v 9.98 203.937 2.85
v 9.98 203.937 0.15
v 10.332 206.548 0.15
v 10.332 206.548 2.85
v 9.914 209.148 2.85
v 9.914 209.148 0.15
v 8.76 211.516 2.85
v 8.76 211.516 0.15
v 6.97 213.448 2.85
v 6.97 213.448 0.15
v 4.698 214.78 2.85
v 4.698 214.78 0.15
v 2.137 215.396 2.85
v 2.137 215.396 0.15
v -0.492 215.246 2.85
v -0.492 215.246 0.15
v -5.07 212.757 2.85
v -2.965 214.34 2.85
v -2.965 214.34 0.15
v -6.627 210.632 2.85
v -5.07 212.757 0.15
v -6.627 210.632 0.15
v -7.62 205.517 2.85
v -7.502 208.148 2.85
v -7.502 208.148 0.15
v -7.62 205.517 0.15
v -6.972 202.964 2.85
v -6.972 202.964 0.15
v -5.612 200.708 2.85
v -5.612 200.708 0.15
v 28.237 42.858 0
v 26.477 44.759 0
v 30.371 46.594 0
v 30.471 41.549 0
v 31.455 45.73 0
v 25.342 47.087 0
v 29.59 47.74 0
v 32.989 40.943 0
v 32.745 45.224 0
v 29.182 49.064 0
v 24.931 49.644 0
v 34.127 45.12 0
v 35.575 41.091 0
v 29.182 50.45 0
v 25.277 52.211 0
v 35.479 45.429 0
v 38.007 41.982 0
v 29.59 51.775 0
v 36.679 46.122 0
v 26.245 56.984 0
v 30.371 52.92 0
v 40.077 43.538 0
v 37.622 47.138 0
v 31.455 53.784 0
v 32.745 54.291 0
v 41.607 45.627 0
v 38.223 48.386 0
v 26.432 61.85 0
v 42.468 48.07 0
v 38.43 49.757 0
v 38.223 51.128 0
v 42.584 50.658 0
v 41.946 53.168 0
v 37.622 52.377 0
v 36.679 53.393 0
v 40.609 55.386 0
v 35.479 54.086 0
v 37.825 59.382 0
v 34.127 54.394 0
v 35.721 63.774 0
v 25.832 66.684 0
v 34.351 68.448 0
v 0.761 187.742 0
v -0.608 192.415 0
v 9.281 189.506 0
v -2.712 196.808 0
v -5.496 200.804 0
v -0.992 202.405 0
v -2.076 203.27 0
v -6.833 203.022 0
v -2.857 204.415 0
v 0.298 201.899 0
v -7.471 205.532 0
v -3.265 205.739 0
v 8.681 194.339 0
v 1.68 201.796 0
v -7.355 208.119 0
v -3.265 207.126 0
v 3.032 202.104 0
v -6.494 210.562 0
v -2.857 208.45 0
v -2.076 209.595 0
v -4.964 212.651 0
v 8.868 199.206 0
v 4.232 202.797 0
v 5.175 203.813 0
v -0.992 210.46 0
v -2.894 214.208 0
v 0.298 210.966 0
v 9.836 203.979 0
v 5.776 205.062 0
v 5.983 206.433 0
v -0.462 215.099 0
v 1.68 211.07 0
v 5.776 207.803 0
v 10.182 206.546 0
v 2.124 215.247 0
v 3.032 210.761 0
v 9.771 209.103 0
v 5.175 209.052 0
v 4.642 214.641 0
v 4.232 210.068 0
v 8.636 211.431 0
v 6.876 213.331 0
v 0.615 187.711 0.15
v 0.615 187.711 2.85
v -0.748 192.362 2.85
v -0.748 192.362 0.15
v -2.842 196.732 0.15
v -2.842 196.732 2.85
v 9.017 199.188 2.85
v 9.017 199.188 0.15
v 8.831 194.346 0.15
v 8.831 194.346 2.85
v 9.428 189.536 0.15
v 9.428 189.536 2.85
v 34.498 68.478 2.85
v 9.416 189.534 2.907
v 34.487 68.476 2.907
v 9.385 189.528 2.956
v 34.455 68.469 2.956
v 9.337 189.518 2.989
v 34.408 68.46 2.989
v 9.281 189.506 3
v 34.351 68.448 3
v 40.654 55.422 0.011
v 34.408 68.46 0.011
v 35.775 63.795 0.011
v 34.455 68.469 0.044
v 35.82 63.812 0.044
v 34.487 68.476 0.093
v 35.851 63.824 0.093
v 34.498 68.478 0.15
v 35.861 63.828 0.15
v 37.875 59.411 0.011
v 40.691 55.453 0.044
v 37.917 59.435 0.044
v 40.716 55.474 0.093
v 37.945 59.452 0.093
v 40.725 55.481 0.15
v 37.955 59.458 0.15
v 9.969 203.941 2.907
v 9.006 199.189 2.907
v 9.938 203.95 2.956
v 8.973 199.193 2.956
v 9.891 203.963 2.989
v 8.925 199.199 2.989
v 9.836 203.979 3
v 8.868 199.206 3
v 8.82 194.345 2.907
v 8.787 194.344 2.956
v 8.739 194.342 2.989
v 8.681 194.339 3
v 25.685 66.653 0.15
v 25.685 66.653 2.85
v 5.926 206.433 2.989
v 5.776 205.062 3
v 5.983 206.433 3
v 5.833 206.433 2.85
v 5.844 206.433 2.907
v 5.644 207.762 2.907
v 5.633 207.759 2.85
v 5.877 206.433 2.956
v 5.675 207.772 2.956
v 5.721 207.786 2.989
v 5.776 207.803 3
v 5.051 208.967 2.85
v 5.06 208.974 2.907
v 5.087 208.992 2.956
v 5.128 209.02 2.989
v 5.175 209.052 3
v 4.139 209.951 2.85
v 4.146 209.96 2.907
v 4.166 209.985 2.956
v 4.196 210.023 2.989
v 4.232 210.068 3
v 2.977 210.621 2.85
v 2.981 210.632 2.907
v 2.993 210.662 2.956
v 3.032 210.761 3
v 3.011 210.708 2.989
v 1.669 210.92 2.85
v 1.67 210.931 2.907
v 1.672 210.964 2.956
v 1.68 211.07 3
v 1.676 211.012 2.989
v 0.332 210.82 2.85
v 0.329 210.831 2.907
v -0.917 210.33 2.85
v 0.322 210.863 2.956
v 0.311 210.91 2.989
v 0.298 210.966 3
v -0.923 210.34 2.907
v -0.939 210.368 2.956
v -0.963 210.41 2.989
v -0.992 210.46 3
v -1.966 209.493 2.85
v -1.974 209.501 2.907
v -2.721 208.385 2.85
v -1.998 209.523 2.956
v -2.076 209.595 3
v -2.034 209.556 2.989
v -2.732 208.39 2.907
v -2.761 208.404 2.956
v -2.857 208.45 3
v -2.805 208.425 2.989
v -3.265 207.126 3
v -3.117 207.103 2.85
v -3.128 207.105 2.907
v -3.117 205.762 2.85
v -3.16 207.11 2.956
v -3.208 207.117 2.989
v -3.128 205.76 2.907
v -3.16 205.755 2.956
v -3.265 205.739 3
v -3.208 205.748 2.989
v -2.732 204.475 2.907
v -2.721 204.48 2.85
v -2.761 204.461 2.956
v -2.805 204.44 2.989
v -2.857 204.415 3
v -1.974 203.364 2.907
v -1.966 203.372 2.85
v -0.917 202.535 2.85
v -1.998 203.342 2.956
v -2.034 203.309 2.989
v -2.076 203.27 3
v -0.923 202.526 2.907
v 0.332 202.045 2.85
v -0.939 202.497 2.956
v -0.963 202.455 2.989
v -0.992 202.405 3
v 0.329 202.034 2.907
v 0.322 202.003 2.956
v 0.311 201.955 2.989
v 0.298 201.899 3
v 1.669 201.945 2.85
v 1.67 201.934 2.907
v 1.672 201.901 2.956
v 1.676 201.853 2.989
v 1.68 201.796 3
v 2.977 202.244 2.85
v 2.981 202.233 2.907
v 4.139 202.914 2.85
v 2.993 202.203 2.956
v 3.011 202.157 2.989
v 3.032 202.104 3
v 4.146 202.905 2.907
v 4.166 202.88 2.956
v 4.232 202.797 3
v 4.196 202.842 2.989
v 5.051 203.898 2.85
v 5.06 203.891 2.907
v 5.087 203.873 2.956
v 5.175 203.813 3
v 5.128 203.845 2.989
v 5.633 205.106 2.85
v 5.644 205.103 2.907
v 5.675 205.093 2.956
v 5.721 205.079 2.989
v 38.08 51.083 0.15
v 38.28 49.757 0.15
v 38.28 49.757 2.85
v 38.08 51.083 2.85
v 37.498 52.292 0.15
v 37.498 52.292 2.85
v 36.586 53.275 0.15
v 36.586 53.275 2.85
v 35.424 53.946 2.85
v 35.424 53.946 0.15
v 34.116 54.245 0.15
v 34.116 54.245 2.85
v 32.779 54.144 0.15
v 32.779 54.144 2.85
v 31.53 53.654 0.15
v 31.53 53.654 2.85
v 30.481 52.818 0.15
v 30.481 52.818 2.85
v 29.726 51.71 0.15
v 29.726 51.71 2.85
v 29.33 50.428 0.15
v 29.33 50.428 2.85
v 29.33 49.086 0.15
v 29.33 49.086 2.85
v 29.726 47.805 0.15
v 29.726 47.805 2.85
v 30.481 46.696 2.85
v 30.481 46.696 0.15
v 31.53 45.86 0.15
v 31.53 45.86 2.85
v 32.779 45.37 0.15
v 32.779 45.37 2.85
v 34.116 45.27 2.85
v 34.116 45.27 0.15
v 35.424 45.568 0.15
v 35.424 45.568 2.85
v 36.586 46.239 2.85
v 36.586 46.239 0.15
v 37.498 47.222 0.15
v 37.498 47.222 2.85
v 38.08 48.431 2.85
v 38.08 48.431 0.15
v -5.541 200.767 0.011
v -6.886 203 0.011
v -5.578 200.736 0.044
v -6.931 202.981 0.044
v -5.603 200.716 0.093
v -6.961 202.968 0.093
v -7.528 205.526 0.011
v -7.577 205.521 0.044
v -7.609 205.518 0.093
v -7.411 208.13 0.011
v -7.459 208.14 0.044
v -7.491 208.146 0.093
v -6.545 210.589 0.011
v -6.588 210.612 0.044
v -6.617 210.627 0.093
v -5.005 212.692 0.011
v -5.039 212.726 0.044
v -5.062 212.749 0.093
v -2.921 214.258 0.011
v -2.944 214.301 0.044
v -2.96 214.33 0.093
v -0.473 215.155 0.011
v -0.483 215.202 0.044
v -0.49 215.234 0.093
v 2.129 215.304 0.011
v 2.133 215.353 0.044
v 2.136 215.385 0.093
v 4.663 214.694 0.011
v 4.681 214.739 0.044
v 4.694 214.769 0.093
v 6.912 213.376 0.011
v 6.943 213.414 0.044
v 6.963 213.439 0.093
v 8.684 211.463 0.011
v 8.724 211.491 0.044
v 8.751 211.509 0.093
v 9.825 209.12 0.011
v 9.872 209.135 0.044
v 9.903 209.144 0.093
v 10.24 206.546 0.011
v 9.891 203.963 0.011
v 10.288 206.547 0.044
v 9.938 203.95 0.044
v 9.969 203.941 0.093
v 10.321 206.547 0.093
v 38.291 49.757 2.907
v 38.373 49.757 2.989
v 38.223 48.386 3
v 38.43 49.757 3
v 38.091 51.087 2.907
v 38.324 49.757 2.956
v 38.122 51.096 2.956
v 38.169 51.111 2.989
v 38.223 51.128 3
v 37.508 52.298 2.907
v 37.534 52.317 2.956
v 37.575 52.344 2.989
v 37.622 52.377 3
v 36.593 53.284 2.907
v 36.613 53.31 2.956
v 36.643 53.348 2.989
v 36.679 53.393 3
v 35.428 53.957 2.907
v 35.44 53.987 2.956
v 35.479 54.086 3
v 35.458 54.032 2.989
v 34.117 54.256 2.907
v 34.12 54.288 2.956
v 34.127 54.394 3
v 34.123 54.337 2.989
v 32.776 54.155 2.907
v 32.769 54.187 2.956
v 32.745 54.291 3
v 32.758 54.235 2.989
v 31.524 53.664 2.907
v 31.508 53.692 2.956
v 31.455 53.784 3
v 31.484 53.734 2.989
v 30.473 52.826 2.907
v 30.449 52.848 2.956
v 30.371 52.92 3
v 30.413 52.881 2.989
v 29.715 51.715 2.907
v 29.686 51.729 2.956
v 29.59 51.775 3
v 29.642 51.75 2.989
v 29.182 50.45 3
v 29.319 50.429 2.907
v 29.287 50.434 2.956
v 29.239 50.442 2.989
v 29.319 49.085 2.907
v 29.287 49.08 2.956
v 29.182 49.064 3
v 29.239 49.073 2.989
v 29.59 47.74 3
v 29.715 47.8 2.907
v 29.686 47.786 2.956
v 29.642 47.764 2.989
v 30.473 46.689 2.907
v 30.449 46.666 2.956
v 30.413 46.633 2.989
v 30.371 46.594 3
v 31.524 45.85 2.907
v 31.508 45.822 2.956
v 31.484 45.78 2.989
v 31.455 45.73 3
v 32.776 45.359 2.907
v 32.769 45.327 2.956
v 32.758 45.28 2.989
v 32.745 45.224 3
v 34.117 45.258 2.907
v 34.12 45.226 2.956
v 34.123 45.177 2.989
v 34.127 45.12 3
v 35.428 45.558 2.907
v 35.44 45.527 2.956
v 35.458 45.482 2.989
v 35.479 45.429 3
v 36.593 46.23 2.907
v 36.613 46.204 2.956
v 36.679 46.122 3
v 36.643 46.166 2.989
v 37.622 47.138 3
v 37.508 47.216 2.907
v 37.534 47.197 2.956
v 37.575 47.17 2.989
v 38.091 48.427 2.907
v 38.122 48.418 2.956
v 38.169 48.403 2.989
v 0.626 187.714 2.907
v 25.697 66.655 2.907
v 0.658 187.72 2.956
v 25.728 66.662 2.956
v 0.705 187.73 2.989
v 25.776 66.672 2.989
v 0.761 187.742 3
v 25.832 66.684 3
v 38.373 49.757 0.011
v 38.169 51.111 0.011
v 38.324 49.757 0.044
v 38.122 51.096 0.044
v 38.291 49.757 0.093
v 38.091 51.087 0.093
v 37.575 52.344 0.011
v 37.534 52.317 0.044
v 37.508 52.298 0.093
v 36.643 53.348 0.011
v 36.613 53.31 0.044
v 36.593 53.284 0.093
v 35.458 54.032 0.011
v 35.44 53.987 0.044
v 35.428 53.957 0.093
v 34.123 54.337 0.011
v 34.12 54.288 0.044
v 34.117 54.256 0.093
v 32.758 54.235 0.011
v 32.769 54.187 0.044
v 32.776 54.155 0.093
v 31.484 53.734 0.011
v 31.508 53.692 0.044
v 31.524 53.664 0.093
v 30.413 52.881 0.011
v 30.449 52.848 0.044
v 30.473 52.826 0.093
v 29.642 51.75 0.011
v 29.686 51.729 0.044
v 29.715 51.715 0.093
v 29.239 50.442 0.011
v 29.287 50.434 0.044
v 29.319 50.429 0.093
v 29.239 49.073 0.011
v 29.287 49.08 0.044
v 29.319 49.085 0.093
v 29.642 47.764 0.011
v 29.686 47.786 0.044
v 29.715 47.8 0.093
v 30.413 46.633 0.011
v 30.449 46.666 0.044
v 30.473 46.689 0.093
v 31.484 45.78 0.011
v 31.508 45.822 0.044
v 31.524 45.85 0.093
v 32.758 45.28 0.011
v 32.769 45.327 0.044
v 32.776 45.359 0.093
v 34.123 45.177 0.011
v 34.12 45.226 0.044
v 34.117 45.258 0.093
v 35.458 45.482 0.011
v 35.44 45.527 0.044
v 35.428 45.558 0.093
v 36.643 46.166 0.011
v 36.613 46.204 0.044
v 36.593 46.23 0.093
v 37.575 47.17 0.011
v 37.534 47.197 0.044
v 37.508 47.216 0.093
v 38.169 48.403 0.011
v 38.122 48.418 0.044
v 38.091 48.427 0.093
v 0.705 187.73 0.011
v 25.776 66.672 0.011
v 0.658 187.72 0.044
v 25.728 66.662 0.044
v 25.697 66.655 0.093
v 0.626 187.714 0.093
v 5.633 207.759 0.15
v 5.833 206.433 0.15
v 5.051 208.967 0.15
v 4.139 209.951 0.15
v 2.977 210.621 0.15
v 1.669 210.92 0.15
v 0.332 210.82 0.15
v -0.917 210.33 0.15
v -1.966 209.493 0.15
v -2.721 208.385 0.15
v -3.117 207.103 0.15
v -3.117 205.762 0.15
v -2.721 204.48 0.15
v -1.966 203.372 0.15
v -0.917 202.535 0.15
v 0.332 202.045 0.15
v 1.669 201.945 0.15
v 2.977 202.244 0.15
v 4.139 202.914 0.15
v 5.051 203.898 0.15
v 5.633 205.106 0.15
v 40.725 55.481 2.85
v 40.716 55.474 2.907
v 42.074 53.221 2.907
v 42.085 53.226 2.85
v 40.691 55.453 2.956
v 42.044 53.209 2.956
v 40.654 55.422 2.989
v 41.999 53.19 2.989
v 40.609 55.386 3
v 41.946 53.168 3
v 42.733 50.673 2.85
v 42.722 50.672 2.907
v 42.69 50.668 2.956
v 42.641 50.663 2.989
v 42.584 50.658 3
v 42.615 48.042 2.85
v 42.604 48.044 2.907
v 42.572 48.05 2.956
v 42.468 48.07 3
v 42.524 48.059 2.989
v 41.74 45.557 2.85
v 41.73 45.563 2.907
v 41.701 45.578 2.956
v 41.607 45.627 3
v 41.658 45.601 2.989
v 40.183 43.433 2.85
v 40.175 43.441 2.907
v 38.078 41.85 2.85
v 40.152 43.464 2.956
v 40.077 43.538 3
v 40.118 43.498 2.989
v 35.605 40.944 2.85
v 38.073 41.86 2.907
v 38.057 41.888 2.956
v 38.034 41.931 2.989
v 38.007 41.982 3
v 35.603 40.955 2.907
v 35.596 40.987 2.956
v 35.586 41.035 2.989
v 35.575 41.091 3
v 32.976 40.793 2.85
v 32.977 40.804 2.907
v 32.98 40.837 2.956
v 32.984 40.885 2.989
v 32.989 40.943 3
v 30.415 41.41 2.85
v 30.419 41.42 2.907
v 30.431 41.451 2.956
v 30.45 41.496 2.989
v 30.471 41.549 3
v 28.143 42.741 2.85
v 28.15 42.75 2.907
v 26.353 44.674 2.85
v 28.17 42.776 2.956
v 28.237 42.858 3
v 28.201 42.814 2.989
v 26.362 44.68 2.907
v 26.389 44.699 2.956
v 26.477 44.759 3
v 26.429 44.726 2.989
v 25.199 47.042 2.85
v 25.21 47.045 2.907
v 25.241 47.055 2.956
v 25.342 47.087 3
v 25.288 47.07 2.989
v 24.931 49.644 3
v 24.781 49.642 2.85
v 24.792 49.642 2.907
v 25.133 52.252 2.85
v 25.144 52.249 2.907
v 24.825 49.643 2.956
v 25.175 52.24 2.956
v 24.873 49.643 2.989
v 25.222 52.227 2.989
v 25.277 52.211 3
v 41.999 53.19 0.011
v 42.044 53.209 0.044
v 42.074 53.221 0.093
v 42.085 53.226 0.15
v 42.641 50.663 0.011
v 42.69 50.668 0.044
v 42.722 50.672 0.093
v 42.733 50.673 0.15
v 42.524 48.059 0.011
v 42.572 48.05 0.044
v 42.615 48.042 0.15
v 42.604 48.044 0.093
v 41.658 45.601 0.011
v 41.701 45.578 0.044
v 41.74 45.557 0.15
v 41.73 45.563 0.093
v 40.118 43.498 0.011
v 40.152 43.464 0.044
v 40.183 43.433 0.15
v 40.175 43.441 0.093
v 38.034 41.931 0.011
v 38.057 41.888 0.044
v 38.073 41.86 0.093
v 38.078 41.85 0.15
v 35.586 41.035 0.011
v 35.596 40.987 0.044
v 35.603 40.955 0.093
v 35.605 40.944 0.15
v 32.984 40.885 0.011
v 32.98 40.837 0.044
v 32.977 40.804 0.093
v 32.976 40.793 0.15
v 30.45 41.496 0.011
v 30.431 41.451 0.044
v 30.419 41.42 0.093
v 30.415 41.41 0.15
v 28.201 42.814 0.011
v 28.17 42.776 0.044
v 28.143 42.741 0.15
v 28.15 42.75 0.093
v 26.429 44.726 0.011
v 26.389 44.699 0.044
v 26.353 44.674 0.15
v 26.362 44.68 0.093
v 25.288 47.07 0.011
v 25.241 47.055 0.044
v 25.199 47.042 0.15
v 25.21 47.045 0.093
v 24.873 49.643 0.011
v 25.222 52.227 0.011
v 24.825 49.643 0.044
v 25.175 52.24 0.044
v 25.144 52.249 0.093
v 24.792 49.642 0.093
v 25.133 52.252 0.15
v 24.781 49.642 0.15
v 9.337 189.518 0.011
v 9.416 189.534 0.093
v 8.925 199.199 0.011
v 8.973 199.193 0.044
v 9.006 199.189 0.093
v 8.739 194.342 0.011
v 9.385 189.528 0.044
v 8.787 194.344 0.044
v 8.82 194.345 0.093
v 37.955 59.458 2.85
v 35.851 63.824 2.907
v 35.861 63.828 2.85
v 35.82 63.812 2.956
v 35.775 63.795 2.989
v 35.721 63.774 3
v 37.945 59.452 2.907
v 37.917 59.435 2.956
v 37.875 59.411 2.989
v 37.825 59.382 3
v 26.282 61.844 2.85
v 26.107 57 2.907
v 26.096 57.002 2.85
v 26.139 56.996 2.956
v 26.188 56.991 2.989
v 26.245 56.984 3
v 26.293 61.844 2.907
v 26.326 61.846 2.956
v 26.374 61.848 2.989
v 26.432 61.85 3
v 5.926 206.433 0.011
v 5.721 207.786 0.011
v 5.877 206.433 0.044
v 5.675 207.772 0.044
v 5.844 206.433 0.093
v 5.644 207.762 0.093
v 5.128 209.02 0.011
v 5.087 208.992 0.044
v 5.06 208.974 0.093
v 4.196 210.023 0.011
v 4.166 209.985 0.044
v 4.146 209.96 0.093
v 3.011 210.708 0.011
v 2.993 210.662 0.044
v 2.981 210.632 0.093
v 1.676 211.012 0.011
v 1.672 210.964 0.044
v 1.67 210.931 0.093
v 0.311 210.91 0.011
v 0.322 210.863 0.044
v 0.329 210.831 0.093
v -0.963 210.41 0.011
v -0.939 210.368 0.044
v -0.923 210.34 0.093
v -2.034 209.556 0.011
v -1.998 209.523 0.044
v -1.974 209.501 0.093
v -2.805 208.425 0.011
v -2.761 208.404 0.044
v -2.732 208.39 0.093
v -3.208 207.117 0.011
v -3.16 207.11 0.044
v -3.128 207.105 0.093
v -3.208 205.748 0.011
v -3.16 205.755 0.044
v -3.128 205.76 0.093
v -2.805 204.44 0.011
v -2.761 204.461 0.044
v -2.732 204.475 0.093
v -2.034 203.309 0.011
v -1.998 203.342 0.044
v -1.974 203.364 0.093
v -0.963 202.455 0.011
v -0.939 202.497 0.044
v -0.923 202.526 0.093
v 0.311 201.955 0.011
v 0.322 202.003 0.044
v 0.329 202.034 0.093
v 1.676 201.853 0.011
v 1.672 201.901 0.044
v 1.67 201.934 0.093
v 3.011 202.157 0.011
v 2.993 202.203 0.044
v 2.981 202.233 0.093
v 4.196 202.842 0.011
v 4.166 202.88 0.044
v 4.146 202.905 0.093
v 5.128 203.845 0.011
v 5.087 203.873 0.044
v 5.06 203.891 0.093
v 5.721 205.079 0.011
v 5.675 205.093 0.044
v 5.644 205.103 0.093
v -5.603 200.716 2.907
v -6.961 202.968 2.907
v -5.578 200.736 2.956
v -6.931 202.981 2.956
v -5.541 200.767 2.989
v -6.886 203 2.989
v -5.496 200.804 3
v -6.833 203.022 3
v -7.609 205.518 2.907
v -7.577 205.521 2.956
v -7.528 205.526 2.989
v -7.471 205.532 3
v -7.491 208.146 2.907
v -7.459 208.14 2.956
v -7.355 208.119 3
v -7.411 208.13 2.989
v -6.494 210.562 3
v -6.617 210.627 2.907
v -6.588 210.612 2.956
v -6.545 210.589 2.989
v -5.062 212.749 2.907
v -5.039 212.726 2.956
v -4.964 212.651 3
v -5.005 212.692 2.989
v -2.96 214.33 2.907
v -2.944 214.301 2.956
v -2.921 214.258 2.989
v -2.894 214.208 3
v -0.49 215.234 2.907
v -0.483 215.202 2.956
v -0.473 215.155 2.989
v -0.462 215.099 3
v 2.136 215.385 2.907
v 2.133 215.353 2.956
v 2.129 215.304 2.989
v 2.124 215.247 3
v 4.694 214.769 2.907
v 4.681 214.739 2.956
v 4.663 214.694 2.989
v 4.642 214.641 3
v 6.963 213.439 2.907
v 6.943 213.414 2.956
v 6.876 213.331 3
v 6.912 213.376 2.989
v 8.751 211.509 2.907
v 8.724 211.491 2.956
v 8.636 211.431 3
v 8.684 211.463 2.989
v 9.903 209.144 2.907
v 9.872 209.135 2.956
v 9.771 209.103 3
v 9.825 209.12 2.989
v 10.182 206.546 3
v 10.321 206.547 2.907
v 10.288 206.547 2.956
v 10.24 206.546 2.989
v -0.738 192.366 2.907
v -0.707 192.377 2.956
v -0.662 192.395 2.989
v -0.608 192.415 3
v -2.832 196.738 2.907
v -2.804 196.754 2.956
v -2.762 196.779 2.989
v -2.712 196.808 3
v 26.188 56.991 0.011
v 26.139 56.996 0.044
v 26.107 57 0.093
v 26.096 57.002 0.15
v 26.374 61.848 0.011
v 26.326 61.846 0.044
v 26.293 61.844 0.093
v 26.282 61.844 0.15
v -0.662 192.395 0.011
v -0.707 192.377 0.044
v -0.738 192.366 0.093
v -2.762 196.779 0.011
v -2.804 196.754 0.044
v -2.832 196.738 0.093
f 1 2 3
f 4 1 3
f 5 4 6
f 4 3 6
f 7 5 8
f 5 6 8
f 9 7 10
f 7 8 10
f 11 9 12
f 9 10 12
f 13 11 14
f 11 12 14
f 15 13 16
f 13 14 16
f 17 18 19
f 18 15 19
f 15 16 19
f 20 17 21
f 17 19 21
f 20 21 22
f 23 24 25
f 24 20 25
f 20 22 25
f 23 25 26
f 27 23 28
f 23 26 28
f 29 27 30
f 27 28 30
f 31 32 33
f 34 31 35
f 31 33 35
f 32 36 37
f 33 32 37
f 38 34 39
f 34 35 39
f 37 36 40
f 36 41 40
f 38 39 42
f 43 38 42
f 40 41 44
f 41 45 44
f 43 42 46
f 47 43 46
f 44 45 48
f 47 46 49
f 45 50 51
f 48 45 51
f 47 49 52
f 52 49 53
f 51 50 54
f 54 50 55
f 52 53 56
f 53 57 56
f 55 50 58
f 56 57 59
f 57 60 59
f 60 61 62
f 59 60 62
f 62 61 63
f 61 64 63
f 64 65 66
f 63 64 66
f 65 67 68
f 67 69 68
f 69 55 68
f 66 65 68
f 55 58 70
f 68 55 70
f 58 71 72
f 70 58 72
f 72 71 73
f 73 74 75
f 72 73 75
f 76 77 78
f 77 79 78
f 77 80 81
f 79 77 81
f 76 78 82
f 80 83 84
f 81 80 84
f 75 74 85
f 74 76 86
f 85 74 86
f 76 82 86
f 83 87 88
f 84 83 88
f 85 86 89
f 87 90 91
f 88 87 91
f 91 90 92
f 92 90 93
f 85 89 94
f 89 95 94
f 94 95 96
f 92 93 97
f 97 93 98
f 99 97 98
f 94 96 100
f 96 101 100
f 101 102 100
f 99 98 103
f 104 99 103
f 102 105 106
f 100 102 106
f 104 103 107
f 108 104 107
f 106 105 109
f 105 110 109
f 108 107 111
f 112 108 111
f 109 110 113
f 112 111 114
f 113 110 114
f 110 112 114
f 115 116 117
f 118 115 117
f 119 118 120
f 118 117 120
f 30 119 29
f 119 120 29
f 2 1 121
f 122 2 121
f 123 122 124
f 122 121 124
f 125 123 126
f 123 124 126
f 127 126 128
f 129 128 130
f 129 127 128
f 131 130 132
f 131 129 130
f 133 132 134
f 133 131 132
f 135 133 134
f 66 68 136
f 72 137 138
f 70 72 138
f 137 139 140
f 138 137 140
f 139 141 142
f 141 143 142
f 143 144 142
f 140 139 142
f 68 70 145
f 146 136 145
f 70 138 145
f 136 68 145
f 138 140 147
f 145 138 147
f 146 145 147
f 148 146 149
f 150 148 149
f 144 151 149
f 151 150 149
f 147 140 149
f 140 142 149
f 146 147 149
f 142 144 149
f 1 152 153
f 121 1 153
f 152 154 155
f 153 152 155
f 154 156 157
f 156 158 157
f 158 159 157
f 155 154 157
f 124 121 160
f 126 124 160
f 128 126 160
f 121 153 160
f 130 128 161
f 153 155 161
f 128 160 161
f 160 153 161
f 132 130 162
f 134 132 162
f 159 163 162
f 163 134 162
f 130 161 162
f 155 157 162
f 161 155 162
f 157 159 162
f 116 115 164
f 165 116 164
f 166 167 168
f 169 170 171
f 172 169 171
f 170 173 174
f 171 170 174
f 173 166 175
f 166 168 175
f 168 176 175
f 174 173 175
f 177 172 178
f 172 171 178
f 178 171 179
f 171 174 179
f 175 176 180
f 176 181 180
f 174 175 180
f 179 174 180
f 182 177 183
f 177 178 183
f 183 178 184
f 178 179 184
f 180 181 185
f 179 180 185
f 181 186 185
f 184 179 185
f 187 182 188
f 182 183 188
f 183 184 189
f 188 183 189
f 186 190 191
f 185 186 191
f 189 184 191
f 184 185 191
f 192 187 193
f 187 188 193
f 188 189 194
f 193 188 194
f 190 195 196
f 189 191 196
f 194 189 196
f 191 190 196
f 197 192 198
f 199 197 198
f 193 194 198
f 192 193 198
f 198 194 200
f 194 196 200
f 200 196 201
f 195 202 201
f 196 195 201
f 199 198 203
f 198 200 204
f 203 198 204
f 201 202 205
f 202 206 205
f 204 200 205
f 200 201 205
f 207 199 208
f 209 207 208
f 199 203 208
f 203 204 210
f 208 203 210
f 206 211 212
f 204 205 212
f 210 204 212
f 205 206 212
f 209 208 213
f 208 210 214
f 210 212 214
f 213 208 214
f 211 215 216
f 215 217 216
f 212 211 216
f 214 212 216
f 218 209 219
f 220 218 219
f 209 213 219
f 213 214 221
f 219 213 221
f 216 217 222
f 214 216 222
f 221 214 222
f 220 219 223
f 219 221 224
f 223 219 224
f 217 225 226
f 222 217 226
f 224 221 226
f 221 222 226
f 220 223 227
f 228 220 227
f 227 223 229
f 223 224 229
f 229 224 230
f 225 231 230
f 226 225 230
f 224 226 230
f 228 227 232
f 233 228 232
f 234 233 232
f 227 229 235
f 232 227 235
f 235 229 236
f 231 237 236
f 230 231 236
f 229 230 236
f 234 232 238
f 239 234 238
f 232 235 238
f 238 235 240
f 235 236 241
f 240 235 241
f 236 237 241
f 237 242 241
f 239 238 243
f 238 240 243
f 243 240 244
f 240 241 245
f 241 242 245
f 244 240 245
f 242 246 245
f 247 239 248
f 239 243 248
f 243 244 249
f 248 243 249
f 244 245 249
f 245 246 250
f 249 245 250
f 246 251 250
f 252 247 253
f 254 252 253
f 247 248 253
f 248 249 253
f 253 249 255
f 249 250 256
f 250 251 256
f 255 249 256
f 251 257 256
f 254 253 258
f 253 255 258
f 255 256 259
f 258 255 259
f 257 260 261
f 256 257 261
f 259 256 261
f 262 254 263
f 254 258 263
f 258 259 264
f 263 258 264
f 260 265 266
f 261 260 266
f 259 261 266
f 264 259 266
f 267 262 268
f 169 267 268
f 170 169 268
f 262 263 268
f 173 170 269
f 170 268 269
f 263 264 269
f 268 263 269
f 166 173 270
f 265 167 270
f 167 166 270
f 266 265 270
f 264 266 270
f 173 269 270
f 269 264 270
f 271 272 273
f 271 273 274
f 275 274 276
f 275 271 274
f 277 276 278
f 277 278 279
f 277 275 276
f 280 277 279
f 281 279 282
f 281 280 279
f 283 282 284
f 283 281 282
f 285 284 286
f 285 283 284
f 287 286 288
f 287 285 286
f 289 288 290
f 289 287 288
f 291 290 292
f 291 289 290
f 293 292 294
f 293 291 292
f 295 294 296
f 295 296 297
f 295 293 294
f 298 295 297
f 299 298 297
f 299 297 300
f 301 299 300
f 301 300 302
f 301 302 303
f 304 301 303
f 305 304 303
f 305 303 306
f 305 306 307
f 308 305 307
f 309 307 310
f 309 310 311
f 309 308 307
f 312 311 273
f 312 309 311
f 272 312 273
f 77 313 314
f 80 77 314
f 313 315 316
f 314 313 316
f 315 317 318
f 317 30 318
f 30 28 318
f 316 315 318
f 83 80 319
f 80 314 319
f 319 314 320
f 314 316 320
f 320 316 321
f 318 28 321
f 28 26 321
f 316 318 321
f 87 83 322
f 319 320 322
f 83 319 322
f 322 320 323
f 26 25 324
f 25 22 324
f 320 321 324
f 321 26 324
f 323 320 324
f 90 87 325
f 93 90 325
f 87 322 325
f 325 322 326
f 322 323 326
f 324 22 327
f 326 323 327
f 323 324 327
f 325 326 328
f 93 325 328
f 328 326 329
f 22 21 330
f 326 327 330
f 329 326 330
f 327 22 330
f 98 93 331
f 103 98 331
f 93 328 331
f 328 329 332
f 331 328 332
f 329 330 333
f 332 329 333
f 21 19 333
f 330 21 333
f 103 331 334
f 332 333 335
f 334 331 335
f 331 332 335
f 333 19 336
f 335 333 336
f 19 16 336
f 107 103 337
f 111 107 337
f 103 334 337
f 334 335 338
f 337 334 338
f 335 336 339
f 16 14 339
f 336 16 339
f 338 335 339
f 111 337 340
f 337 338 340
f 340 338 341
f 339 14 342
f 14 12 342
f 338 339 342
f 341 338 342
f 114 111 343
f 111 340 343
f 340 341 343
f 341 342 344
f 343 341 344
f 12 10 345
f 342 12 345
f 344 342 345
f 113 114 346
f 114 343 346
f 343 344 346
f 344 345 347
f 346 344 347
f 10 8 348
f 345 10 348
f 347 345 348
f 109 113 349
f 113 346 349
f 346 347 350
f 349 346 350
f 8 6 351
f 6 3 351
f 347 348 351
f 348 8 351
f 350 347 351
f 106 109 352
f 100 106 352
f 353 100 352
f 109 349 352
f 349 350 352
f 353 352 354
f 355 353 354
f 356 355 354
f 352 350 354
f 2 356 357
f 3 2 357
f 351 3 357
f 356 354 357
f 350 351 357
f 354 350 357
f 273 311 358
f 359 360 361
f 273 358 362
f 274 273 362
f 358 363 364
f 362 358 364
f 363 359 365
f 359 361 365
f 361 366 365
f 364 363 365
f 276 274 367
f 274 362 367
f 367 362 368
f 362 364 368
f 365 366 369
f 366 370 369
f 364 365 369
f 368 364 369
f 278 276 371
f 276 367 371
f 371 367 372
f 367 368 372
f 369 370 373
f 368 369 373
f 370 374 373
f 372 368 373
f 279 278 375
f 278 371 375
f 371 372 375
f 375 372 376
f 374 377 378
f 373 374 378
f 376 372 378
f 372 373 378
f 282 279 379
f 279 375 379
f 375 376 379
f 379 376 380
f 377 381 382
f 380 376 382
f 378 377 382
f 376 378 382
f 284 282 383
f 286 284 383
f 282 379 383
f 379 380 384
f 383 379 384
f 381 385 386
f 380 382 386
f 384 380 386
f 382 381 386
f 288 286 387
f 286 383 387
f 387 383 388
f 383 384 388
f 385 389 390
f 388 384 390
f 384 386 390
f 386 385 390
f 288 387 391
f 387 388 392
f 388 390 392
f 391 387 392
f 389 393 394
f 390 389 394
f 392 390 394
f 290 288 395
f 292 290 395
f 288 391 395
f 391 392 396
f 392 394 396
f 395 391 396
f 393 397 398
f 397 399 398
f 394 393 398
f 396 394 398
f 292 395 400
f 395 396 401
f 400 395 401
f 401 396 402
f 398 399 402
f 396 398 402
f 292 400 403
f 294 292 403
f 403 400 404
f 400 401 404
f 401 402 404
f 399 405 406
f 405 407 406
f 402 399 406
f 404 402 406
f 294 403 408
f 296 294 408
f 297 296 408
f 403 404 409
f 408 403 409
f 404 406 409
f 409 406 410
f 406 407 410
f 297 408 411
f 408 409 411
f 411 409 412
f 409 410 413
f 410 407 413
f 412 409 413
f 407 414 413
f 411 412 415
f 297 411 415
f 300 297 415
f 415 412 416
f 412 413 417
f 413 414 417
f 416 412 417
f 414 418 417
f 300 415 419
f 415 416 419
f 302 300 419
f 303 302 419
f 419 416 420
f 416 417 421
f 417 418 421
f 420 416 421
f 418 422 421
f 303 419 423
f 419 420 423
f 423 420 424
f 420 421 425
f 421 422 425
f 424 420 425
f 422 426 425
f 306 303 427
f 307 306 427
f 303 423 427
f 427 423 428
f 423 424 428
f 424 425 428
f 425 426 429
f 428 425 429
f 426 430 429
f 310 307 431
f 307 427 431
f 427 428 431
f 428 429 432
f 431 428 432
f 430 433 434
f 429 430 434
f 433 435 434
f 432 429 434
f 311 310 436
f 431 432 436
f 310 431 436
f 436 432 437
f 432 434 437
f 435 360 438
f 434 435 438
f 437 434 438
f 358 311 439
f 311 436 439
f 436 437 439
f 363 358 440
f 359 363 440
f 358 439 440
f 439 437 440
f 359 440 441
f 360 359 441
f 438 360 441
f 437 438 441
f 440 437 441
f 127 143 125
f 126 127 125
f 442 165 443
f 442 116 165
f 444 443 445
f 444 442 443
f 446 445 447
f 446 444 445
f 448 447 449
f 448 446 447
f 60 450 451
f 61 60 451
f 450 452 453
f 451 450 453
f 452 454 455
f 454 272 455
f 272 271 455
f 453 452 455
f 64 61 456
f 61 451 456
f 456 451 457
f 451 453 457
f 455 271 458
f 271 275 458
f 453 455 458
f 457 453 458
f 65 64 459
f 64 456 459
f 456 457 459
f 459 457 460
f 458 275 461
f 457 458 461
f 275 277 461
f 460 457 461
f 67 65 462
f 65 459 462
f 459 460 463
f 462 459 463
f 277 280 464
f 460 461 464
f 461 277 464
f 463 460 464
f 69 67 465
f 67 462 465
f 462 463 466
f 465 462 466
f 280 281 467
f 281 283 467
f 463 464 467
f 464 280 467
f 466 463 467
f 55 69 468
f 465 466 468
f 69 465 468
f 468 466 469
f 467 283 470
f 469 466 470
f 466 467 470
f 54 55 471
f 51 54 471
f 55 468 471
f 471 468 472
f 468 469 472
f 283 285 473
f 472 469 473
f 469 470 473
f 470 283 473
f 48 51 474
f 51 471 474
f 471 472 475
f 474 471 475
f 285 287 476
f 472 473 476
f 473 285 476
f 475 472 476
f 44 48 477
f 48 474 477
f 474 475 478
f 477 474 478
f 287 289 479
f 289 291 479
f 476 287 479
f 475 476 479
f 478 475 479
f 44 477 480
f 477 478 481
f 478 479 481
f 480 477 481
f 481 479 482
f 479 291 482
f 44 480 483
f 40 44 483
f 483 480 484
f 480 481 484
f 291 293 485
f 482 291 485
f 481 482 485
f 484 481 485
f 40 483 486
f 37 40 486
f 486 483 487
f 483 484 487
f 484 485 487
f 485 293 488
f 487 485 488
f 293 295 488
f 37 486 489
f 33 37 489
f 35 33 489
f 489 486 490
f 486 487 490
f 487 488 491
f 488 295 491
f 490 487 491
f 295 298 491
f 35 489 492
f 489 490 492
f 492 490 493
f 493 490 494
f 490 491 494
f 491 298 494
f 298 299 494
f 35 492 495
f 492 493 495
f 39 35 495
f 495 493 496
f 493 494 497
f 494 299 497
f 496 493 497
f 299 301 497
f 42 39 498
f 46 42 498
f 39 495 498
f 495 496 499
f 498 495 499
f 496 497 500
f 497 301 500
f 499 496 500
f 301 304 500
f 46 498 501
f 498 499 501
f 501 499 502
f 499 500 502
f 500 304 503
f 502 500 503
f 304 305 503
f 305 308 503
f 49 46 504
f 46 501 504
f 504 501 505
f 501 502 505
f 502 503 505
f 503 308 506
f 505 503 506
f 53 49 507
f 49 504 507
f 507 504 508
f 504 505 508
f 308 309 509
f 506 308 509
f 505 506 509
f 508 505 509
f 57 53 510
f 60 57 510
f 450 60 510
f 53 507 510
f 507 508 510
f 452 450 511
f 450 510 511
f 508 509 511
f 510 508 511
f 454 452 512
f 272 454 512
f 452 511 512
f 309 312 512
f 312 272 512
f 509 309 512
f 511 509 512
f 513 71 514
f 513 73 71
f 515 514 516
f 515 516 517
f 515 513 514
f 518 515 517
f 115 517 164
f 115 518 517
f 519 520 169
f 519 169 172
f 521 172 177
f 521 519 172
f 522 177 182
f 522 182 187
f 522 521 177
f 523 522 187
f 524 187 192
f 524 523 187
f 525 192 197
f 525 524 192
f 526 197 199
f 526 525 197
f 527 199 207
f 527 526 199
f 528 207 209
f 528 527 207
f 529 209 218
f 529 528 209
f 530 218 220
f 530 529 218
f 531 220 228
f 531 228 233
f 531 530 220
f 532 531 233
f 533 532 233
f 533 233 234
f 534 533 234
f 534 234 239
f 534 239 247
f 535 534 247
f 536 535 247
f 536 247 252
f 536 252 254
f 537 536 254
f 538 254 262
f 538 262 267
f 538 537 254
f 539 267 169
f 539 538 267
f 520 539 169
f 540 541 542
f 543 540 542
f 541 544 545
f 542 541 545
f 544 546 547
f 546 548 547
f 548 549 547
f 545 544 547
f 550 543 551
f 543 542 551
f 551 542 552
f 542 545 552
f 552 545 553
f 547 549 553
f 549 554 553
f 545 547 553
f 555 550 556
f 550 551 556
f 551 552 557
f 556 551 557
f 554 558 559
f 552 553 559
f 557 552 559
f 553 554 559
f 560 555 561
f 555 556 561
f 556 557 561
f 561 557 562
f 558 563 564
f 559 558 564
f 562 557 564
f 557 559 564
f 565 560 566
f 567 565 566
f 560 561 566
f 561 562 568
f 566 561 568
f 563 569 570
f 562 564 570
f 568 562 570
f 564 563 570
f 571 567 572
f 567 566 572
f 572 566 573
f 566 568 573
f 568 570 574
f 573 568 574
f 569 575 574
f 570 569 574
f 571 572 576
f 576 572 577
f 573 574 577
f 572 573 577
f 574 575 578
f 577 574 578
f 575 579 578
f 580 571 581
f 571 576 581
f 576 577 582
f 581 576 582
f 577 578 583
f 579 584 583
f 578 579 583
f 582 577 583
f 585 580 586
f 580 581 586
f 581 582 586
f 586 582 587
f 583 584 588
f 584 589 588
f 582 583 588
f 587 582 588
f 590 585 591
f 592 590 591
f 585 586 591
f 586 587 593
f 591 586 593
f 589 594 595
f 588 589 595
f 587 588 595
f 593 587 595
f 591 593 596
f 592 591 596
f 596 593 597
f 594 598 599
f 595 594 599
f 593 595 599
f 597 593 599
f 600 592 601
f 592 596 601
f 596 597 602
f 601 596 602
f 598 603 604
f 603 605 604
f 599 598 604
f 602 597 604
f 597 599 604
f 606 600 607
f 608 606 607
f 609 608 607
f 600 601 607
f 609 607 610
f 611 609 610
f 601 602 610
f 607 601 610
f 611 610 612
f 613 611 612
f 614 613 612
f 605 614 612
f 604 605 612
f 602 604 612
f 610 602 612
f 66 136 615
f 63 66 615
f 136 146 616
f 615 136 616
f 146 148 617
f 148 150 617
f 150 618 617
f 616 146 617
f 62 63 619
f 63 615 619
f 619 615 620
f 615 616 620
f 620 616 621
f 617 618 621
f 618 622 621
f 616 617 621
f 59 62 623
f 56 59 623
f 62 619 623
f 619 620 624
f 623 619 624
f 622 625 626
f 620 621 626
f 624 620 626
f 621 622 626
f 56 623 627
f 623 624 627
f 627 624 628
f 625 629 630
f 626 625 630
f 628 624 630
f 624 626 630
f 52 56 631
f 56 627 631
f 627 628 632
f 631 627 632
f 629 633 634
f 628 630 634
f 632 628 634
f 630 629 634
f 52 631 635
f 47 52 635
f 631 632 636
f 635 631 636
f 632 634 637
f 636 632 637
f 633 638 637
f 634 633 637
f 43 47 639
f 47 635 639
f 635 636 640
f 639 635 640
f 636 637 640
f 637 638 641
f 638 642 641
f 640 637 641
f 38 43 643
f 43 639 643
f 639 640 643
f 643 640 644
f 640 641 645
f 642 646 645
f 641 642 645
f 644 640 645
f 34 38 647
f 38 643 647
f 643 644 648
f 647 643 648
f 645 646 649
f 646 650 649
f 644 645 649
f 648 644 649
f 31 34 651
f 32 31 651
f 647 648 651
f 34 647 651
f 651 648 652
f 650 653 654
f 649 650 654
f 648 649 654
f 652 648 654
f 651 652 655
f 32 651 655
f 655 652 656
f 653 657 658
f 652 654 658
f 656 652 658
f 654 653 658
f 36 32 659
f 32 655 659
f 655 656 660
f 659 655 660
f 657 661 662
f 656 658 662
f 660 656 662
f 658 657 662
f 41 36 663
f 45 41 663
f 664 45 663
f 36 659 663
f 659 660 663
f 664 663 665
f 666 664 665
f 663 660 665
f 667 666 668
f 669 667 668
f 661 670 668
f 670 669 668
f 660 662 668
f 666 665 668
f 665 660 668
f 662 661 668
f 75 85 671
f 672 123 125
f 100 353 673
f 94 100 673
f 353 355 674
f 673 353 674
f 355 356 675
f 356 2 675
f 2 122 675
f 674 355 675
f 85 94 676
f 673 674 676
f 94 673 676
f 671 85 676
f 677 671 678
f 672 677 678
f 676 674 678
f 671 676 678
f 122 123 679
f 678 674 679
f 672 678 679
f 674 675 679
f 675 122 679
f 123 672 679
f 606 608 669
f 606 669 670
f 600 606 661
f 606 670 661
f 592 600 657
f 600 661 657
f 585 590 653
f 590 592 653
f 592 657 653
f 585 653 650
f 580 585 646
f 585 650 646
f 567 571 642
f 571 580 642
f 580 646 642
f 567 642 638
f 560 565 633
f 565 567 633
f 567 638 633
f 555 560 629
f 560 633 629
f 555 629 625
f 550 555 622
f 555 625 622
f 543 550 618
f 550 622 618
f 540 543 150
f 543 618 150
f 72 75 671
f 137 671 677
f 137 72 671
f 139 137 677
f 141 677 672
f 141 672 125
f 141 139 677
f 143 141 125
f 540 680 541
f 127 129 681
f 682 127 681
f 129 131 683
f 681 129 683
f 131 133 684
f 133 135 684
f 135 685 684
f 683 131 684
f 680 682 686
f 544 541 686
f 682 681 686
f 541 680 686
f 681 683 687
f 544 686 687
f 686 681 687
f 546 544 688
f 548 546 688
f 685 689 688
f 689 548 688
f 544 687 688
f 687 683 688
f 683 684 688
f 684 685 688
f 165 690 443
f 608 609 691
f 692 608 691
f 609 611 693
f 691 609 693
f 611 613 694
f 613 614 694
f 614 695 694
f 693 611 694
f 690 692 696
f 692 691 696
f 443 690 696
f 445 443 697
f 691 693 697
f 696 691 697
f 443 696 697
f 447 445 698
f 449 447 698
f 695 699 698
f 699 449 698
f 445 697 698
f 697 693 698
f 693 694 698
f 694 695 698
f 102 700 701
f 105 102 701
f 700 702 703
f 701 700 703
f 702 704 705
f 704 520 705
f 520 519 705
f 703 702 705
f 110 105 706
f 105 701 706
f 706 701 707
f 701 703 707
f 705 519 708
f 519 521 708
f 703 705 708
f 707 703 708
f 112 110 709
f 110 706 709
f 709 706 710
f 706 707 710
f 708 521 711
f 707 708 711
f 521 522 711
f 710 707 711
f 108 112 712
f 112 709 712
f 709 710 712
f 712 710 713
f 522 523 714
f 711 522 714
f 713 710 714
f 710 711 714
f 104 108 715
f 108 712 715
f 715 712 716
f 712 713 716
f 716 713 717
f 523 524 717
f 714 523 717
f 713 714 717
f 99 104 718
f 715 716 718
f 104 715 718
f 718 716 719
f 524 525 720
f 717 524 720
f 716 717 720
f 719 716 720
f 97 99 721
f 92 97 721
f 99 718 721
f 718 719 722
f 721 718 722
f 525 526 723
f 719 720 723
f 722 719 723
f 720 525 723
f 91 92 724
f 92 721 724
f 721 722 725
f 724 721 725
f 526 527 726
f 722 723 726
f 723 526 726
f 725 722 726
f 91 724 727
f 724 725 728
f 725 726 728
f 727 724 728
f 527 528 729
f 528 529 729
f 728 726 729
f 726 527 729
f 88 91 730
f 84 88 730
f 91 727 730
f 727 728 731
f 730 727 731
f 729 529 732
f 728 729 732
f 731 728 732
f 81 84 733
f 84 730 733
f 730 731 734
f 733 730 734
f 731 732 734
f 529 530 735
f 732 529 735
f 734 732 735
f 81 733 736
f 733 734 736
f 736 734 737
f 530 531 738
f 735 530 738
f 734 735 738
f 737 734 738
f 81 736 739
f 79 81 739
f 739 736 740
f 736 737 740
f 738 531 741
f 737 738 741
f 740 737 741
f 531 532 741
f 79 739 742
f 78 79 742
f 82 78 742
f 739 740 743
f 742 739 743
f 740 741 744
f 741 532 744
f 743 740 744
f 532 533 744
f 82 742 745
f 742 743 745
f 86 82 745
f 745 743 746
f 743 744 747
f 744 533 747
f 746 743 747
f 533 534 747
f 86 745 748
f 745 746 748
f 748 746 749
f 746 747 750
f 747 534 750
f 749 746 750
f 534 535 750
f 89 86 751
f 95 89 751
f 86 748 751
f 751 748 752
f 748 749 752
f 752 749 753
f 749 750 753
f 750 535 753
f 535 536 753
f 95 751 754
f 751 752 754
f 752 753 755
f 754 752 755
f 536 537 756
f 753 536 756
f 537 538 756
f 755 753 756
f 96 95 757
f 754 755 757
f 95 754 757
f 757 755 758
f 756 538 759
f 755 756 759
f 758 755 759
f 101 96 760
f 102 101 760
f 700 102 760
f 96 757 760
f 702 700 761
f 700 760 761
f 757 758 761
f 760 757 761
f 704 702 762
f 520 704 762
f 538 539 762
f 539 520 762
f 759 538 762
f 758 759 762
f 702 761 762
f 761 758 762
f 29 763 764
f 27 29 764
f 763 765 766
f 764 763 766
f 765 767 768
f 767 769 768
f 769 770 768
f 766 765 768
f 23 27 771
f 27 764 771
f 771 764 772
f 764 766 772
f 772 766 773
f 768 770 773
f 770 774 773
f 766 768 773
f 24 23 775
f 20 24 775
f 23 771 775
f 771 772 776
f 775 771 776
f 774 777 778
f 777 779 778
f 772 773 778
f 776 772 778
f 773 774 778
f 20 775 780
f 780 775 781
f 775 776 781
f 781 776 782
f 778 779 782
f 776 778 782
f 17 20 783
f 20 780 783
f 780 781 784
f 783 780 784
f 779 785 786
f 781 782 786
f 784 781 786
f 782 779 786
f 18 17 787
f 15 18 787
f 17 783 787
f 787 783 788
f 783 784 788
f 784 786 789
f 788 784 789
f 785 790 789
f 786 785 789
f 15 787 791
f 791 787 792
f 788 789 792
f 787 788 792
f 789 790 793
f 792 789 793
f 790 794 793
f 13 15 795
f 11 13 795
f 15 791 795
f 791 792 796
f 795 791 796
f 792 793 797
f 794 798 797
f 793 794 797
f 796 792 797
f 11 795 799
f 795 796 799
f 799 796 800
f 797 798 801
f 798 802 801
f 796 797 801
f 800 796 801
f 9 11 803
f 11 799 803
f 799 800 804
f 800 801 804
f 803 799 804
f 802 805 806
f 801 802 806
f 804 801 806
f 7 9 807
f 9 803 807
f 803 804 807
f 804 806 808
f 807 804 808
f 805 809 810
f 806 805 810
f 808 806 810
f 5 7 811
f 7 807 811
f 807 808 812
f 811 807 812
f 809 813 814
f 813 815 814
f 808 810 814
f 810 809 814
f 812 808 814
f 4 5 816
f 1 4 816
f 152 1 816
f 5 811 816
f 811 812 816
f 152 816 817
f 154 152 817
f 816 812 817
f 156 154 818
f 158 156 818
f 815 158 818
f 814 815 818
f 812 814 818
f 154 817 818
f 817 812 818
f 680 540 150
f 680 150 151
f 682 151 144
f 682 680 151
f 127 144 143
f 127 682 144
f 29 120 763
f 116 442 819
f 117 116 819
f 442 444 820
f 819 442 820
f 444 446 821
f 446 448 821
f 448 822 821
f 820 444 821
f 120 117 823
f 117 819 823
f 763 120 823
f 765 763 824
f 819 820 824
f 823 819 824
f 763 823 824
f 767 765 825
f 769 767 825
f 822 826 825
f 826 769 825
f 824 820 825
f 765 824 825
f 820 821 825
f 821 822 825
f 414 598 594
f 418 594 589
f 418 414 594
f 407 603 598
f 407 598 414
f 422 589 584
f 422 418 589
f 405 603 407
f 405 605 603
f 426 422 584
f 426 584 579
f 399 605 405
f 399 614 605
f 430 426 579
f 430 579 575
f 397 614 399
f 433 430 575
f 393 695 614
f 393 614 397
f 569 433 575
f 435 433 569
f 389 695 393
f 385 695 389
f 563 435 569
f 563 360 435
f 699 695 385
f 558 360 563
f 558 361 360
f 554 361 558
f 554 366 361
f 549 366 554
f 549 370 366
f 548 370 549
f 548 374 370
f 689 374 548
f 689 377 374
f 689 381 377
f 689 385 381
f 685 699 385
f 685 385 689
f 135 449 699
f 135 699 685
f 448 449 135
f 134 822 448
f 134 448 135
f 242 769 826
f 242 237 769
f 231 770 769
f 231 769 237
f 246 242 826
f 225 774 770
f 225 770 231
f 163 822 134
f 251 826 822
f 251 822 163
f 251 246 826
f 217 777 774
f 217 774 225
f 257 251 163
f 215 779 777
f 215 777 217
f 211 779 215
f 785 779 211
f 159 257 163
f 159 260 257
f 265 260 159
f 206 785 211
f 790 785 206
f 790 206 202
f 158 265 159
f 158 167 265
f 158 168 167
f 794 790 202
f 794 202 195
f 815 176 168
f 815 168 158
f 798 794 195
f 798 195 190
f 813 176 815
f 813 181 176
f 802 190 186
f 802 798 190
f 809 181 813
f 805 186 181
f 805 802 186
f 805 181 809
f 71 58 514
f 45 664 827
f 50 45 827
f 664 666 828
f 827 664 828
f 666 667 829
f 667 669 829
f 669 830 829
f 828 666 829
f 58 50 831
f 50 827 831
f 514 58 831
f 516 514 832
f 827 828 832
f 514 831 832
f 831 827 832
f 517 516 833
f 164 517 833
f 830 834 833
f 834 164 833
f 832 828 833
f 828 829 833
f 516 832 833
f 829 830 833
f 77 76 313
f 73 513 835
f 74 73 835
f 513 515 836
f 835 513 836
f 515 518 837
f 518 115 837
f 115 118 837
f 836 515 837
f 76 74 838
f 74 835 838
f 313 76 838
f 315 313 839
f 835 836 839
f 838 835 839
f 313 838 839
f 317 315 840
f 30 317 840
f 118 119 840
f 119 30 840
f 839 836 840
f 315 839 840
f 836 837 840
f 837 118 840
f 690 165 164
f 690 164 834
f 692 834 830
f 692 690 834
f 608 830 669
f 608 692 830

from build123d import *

# Parameters (mm, degrees)
SZKIC2_R                    = 4.5
DODANIE_WYCI_GNI_CIE1_DEPTH = 3
ZAOKR_GLENIE1_R             = 30
ZAOKR_GLENIE2_R             = 30
ZAOKR_GLENIE3_R             = 30
ZAOKR_GLENIE4_R             = 30
ZAOKR_GLENIE5_R             = 0.15


with BuildPart() as part:
    # Szkic2 → Dodanie-wyciągnięcie1 (new body)
    with BuildSketch(Plane.XY):
        with BuildLine():
            ThreePointArc((27.792879551, 56.476790511), (35.605147637, 40.944096516), (36.605872011, 58.301938148))
            Line((36.605872011, 58.301938148), (7.320051345, 199.712808955))
            ThreePointArc((7.320051345, 199.712808955), (-0.492216741, 215.24550295), (-1.492941115, 197.887661317))
            Line((-1.492941115, 197.887661317), (27.792879551, 56.476790511))
        make_face()
        with Locations((33.78, 49.757088976)):
            Circle(SZKIC2_R, mode=Mode.SUBTRACT)
        with Locations((1.332930896, 206.43251049)):
            Circle(SZKIC2_R, mode=Mode.SUBTRACT)
    extrude(amount=DODANIE_WYCI_GNI_CIE1_DEPTH)

    # Zaokrąglenie1
    zaokr_glenie1_edges = [part.edges().sort_by_distance(p)[0] for p in [
        (-1.492941115, 197.887661317, 1.5),
    ]]
    fillet(zaokr_glenie1_edges, radius=ZAOKR_GLENIE1_R)

    # Zaokrąglenie2
    zaokr_glenie2_edges = [part.edges().sort_by_distance(p)[0] for p in [
        (7.320051345, 199.712808955, 1.5),
    ]]
    fillet(zaokr_glenie2_edges, radius=ZAOKR_GLENIE2_R)

    # Zaokrąglenie3
    zaokr_glenie3_edges = [part.edges().sort_by_distance(p)[0] for p in [
        (27.792879551, 56.476790511, 1.5),
    ]]
    fillet(zaokr_glenie3_edges, radius=ZAOKR_GLENIE3_R)

    # Zaokrąglenie4
    zaokr_glenie4_edges = [part.edges().sort_by_distance(p)[0] for p in [
        (36.605872011, 58.301938148, 1.5),
    ]]
    fillet(zaokr_glenie4_edges, radius=ZAOKR_GLENIE4_R)

    # Zaokrąglenie5
    zaokr_glenie5_edges = [part.edges().sort_by_distance(p)[0] for p in [
        (-3.167069104, 206.43251049, 3),
        (-1.706720857, 194.589233339, 0),
        (-1.706720857, 194.589233339, 3),
        (29.28, 49.757088976, 3),
        (-0.492216741, 215.24550295, 0),
        (-0.492216741, 215.24550295, 3),
        (8.82625379, 196.770584778, 0),
        (8.82625379, 196.770584778, 3),
        (35.605147637, 40.944096516, 0),
        (35.605147637, 40.944096516, 3),
        (13.149969218, 127.182225914, 3),
        (13.149969218, 127.182225914, 0),
        (26.286677106, 59.419014688, 0),
        (26.286677106, 59.419014688, 3),
        (21.962961678, 129.007373551, 0),
        (21.962961678, 129.007373551, 3),
        (36.819651752, 61.600366127, 0),
        (36.819651752, 61.600366127, 3),
        (29.28, 49.757088976, 0),
        (-3.167069104, 206.43251049, 0),
    ]]
    fillet(zaokr_glenie5_edges, radius=ZAOKR_GLENIE5_R)


solid = part.part
